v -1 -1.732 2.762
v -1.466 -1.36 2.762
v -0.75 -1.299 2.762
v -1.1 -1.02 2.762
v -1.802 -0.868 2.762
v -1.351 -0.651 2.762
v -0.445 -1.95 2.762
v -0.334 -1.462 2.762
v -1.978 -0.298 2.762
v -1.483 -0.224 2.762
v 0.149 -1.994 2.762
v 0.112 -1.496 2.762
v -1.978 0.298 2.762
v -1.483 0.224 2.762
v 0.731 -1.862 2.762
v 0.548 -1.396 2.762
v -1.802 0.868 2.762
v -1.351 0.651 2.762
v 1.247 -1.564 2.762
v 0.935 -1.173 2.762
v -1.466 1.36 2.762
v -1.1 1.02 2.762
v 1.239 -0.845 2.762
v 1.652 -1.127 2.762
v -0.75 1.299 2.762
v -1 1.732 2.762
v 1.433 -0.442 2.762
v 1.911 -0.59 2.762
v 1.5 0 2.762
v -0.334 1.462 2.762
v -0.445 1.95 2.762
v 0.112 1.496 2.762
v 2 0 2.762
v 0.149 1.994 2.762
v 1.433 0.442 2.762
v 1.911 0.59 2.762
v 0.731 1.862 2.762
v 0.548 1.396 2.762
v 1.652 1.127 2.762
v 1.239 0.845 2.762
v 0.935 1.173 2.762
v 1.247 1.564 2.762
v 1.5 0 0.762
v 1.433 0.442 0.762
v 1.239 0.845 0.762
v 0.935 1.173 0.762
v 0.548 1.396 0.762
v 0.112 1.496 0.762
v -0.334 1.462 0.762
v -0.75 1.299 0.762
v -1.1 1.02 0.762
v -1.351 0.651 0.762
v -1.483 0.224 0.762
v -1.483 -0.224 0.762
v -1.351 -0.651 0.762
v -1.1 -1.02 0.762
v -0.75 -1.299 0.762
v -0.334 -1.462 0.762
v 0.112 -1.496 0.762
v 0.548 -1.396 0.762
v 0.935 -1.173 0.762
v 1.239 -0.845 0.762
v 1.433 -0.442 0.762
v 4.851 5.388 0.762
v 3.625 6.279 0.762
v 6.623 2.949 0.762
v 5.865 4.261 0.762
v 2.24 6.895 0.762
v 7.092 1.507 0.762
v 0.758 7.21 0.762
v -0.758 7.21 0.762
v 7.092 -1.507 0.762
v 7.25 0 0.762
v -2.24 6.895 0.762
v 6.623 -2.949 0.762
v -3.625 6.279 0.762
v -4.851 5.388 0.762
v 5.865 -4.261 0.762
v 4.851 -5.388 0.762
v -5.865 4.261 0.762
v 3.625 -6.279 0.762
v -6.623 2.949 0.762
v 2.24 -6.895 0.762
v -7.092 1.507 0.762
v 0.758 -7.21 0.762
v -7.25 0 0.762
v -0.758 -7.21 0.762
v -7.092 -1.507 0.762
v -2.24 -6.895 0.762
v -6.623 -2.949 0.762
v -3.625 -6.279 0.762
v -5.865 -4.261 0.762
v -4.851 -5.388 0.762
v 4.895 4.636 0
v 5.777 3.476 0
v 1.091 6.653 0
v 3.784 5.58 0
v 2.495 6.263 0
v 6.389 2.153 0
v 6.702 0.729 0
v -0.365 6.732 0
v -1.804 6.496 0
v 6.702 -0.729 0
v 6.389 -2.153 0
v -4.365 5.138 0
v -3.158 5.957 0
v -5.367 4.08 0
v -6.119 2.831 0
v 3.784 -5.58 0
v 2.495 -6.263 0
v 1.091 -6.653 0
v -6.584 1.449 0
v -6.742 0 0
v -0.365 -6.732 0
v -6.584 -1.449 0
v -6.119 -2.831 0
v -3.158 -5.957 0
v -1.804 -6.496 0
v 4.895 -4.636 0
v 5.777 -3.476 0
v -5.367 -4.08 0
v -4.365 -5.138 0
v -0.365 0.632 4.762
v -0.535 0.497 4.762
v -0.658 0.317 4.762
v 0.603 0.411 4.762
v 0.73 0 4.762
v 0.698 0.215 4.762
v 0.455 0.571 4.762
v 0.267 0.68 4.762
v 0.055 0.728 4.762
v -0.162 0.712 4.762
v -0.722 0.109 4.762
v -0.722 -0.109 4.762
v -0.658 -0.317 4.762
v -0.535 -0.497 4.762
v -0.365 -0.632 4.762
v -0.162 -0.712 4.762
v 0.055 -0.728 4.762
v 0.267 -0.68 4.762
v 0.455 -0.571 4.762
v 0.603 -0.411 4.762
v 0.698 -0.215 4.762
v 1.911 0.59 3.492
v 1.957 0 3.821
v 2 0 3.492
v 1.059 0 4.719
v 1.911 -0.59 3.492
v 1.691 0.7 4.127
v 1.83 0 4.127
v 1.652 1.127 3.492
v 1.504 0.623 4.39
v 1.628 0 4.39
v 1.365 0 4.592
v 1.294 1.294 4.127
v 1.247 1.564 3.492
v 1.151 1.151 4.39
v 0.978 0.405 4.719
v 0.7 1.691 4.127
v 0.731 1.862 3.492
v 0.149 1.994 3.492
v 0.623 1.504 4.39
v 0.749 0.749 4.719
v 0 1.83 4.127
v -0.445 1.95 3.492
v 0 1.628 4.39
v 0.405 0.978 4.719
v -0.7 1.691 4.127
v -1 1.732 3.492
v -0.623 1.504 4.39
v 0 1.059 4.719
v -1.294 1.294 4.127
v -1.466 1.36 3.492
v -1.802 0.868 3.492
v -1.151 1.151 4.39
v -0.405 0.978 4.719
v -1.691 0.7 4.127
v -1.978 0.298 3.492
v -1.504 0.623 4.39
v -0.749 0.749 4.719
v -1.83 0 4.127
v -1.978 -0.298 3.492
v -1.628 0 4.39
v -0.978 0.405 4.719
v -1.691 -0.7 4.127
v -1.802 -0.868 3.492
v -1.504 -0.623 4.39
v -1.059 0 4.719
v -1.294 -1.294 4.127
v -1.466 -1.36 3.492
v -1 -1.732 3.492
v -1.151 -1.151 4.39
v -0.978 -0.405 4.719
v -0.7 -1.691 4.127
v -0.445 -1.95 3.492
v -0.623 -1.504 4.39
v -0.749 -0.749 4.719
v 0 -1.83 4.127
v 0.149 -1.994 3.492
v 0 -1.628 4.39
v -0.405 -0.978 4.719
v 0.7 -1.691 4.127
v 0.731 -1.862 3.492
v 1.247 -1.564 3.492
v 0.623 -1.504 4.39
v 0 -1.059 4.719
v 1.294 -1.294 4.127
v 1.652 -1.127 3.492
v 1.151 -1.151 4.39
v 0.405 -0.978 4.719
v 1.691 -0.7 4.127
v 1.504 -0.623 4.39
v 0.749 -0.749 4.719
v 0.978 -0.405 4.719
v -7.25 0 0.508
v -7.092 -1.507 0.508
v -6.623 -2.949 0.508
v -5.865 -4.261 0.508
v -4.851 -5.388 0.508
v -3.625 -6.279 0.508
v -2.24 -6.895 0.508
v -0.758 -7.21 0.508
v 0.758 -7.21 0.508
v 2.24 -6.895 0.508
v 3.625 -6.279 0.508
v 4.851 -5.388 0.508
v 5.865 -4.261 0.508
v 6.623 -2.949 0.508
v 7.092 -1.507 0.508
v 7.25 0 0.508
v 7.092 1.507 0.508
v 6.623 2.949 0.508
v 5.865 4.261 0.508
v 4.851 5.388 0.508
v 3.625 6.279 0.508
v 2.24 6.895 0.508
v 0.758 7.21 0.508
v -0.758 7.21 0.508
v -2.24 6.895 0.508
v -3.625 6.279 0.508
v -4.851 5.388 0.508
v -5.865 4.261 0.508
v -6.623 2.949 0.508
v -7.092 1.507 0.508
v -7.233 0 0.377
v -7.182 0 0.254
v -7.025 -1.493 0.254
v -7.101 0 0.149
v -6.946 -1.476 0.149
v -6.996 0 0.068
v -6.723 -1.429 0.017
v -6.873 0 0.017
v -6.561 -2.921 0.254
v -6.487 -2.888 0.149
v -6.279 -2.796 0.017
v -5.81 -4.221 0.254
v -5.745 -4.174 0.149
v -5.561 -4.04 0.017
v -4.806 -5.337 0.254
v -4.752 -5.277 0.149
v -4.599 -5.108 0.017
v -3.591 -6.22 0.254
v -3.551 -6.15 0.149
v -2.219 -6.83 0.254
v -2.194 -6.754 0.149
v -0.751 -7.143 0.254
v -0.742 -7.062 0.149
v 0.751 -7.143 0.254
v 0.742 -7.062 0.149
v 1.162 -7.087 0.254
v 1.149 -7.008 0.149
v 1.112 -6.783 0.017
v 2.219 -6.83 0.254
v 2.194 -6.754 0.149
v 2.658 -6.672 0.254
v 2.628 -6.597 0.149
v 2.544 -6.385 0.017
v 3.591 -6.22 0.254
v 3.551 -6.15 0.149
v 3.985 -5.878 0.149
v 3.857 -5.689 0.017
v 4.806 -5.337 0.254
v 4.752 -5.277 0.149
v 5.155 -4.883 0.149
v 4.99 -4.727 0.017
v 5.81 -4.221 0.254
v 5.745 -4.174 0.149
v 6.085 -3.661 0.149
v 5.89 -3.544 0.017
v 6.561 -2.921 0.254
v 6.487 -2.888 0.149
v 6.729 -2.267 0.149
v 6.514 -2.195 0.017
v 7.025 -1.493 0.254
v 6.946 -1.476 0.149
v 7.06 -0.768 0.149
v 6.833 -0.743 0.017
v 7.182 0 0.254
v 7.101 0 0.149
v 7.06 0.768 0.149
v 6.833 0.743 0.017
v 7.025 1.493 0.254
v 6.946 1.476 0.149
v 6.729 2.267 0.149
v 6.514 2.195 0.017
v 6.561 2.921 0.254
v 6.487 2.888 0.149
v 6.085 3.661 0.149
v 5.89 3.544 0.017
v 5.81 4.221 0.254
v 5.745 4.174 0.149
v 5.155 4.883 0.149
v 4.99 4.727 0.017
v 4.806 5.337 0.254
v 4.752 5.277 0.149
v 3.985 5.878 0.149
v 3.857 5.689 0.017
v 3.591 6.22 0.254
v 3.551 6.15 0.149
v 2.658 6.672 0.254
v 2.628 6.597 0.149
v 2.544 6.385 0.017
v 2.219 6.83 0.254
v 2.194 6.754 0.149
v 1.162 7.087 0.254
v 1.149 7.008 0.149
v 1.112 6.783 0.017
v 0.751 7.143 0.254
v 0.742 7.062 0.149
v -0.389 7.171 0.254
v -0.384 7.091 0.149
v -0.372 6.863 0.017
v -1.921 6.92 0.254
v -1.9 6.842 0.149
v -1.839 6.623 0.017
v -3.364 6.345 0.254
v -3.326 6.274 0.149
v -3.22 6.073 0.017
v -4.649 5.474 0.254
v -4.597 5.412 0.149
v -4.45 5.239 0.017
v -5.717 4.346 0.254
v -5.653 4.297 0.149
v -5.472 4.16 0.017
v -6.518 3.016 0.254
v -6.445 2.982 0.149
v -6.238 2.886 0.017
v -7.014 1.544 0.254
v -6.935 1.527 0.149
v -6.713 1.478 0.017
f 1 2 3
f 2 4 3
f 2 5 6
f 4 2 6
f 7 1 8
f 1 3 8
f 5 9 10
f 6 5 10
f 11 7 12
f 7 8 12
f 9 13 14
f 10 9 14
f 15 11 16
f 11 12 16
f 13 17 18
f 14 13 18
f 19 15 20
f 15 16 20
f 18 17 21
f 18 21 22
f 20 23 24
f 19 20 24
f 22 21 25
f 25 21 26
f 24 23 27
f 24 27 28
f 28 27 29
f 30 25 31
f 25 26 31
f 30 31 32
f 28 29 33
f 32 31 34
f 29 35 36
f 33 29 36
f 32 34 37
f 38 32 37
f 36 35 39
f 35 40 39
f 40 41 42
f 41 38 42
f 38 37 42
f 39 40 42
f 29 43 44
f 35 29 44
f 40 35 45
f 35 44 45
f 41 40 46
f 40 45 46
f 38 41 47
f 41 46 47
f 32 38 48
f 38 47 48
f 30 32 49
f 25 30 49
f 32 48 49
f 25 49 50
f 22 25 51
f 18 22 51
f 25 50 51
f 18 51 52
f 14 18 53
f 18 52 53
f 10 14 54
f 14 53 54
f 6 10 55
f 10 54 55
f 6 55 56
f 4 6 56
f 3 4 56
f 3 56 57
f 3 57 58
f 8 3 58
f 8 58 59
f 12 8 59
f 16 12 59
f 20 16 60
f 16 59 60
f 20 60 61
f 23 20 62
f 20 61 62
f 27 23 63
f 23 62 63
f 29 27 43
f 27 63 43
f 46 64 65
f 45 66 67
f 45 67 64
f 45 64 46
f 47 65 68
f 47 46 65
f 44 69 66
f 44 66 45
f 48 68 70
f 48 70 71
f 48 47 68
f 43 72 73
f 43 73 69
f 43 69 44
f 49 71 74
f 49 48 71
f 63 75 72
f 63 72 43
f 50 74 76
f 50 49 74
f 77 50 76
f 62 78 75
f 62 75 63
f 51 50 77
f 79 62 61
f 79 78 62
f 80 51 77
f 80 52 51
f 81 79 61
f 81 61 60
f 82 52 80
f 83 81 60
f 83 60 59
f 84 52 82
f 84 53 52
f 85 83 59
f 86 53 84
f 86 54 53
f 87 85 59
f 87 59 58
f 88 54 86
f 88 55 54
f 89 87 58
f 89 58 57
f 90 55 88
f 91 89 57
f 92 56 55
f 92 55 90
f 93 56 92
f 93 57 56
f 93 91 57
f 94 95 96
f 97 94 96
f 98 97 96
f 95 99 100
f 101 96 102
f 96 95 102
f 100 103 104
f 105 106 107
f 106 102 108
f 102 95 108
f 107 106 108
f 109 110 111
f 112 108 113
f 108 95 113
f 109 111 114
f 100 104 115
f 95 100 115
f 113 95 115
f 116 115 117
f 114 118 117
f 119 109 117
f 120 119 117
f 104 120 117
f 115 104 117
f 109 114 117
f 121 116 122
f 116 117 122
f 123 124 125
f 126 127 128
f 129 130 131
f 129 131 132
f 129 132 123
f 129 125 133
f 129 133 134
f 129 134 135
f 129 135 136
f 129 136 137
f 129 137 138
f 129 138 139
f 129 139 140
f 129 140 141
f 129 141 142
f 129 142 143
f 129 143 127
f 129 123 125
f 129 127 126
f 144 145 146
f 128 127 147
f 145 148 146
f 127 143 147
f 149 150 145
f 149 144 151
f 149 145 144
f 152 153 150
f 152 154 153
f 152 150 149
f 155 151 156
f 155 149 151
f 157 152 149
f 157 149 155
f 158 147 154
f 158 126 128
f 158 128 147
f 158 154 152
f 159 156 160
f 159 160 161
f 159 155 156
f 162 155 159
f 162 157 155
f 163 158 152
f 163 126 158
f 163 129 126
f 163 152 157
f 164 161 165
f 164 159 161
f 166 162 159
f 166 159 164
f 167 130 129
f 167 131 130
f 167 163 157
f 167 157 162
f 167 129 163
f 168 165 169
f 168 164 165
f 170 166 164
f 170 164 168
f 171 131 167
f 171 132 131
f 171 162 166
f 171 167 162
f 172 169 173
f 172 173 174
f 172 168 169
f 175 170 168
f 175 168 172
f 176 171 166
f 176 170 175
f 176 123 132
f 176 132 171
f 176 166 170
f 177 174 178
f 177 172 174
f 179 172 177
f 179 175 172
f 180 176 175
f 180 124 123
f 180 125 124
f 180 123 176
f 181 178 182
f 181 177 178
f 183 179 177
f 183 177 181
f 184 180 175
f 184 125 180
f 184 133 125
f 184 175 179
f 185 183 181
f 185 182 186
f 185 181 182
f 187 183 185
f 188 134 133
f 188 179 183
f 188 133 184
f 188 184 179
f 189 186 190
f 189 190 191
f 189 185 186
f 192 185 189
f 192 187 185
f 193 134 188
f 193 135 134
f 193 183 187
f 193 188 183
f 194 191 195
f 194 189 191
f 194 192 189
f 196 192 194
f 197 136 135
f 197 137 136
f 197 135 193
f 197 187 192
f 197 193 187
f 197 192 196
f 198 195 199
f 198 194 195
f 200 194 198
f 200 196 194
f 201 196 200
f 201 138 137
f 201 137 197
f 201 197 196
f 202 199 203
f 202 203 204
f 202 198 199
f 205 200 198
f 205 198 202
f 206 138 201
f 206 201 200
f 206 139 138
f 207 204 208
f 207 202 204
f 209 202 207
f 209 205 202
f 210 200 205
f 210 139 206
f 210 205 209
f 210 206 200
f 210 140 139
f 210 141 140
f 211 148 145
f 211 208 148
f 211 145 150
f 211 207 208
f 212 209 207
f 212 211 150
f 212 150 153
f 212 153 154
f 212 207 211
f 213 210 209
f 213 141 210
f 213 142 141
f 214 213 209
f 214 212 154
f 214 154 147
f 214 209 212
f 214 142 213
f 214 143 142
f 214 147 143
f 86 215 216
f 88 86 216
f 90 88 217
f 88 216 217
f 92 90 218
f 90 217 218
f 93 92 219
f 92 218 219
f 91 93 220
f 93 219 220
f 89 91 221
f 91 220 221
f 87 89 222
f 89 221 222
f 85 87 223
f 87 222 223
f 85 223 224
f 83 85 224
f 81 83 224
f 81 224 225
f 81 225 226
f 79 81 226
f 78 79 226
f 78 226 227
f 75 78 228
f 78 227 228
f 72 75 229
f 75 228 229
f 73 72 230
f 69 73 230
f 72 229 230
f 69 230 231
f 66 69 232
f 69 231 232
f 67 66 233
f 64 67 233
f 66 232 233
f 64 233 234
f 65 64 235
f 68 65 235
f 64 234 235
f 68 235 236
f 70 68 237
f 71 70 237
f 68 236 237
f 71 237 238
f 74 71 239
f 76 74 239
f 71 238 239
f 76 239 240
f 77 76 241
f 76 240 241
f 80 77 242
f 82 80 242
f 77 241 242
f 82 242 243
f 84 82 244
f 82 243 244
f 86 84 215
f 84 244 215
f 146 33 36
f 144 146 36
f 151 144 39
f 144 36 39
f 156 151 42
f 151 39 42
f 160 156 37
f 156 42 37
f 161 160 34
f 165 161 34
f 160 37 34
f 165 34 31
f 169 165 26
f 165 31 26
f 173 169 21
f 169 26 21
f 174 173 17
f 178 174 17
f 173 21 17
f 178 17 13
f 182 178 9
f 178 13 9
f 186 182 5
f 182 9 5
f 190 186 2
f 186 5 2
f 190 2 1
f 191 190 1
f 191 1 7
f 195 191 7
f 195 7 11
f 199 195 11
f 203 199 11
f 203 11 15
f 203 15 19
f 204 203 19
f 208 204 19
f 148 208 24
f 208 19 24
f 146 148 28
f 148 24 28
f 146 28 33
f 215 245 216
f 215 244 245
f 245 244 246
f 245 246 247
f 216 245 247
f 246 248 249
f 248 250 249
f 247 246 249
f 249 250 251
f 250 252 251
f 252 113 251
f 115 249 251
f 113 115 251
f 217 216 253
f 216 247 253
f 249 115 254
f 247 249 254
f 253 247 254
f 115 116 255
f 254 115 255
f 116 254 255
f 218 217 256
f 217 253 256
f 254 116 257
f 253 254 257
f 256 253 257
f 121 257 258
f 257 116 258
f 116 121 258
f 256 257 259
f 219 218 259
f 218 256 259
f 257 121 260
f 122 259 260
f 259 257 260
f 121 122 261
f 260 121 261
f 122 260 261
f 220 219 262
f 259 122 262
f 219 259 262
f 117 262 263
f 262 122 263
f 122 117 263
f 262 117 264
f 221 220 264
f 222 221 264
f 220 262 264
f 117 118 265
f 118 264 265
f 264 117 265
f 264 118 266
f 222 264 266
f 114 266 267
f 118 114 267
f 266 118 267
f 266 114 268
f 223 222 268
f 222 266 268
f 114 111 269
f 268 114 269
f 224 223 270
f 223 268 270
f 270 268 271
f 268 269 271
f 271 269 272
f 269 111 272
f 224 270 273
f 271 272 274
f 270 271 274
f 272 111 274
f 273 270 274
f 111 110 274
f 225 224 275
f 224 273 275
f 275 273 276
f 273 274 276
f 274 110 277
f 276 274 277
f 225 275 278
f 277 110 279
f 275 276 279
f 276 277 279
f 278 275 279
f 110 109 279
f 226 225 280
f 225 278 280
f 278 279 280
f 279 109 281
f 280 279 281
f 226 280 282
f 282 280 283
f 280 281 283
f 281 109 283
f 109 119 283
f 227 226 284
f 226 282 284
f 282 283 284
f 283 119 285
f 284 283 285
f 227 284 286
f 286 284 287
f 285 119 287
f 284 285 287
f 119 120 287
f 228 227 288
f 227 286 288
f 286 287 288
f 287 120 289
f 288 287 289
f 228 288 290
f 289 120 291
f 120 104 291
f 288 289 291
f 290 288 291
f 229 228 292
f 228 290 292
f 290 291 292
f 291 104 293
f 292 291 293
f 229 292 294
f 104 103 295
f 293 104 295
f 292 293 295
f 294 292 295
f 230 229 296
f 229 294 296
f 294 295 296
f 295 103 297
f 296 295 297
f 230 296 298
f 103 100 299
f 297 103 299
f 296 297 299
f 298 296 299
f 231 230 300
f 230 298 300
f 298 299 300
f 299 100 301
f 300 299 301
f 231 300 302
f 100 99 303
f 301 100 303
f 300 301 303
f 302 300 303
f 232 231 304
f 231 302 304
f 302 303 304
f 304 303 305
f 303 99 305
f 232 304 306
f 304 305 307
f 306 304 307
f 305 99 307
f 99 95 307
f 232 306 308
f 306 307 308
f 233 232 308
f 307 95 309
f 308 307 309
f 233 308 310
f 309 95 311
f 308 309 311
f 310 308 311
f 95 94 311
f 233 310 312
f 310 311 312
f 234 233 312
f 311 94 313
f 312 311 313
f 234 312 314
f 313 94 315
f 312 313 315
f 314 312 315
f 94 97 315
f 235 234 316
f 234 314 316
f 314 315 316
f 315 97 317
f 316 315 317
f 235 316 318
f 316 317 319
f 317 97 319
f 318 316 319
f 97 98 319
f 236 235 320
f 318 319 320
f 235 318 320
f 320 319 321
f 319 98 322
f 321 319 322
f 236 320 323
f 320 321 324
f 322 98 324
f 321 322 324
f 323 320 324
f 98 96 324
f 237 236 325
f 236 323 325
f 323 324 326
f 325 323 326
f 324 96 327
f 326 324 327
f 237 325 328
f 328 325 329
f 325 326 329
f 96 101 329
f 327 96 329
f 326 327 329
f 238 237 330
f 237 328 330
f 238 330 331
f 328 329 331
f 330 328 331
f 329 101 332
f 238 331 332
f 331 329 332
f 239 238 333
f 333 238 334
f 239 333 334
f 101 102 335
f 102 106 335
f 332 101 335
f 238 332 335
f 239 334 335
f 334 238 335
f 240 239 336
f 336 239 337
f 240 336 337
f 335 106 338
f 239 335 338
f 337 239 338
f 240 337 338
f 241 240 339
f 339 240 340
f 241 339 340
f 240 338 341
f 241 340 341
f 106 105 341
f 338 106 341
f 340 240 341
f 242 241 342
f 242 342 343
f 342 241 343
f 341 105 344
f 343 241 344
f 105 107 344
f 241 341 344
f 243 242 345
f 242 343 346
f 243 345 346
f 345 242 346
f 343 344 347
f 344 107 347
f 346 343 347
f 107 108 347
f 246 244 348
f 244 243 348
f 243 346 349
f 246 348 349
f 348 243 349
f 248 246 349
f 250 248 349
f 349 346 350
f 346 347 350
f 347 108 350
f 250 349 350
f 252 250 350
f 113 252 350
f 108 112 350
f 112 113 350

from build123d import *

# Parameters (mm, degrees)
SKETCH1_R           = 7.25
BOSS_EXTRUDE1_DEPTH = 0.762
FILLET1_R           = 0.508
SKETCH2_R           = 1.5
BOSS_EXTRUDE2_DEPTH = 2
SKETCH3_R           = 2
BOSS_EXTRUDE3_DEPTH = 2
FILLET2_R           = 1.27


with BuildPart() as part:
    # Sketch1 → Boss-Extrude1 (new body)
    with BuildSketch(Plane.XY):
        with Locations(Location((0, 0, 0), (0, 0, 180))):
            Circle(SKETCH1_R)
    extrude(amount=BOSS_EXTRUDE1_DEPTH)

    # Fillet1
    fillet1_edges = [part.edges().sort_by_distance(p)[0] for p in [
        (7.25, 0, 0),
    ]]
    fillet(fillet1_edges, radius=FILLET1_R)

    # Sketch2 → Boss-Extrude2 (add)
    with BuildSketch(Plane.XY.offset(0.762)):
        Circle(SKETCH2_R)
    extrude(amount=BOSS_EXTRUDE2_DEPTH)

    # Sketch3 → Boss-Extrude3 (add)
    with BuildSketch(Plane.XY.offset(2.762)):
        Circle(SKETCH3_R)
    extrude(amount=BOSS_EXTRUDE3_DEPTH)

    # Fillet2
    fillet2_edges = [part.edges().sort_by_distance(p)[0] for p in [
        (-2, 0, 4.762),
    ]]
    fillet(fillet2_edges, radius=FILLET2_R)


solid = part.part
